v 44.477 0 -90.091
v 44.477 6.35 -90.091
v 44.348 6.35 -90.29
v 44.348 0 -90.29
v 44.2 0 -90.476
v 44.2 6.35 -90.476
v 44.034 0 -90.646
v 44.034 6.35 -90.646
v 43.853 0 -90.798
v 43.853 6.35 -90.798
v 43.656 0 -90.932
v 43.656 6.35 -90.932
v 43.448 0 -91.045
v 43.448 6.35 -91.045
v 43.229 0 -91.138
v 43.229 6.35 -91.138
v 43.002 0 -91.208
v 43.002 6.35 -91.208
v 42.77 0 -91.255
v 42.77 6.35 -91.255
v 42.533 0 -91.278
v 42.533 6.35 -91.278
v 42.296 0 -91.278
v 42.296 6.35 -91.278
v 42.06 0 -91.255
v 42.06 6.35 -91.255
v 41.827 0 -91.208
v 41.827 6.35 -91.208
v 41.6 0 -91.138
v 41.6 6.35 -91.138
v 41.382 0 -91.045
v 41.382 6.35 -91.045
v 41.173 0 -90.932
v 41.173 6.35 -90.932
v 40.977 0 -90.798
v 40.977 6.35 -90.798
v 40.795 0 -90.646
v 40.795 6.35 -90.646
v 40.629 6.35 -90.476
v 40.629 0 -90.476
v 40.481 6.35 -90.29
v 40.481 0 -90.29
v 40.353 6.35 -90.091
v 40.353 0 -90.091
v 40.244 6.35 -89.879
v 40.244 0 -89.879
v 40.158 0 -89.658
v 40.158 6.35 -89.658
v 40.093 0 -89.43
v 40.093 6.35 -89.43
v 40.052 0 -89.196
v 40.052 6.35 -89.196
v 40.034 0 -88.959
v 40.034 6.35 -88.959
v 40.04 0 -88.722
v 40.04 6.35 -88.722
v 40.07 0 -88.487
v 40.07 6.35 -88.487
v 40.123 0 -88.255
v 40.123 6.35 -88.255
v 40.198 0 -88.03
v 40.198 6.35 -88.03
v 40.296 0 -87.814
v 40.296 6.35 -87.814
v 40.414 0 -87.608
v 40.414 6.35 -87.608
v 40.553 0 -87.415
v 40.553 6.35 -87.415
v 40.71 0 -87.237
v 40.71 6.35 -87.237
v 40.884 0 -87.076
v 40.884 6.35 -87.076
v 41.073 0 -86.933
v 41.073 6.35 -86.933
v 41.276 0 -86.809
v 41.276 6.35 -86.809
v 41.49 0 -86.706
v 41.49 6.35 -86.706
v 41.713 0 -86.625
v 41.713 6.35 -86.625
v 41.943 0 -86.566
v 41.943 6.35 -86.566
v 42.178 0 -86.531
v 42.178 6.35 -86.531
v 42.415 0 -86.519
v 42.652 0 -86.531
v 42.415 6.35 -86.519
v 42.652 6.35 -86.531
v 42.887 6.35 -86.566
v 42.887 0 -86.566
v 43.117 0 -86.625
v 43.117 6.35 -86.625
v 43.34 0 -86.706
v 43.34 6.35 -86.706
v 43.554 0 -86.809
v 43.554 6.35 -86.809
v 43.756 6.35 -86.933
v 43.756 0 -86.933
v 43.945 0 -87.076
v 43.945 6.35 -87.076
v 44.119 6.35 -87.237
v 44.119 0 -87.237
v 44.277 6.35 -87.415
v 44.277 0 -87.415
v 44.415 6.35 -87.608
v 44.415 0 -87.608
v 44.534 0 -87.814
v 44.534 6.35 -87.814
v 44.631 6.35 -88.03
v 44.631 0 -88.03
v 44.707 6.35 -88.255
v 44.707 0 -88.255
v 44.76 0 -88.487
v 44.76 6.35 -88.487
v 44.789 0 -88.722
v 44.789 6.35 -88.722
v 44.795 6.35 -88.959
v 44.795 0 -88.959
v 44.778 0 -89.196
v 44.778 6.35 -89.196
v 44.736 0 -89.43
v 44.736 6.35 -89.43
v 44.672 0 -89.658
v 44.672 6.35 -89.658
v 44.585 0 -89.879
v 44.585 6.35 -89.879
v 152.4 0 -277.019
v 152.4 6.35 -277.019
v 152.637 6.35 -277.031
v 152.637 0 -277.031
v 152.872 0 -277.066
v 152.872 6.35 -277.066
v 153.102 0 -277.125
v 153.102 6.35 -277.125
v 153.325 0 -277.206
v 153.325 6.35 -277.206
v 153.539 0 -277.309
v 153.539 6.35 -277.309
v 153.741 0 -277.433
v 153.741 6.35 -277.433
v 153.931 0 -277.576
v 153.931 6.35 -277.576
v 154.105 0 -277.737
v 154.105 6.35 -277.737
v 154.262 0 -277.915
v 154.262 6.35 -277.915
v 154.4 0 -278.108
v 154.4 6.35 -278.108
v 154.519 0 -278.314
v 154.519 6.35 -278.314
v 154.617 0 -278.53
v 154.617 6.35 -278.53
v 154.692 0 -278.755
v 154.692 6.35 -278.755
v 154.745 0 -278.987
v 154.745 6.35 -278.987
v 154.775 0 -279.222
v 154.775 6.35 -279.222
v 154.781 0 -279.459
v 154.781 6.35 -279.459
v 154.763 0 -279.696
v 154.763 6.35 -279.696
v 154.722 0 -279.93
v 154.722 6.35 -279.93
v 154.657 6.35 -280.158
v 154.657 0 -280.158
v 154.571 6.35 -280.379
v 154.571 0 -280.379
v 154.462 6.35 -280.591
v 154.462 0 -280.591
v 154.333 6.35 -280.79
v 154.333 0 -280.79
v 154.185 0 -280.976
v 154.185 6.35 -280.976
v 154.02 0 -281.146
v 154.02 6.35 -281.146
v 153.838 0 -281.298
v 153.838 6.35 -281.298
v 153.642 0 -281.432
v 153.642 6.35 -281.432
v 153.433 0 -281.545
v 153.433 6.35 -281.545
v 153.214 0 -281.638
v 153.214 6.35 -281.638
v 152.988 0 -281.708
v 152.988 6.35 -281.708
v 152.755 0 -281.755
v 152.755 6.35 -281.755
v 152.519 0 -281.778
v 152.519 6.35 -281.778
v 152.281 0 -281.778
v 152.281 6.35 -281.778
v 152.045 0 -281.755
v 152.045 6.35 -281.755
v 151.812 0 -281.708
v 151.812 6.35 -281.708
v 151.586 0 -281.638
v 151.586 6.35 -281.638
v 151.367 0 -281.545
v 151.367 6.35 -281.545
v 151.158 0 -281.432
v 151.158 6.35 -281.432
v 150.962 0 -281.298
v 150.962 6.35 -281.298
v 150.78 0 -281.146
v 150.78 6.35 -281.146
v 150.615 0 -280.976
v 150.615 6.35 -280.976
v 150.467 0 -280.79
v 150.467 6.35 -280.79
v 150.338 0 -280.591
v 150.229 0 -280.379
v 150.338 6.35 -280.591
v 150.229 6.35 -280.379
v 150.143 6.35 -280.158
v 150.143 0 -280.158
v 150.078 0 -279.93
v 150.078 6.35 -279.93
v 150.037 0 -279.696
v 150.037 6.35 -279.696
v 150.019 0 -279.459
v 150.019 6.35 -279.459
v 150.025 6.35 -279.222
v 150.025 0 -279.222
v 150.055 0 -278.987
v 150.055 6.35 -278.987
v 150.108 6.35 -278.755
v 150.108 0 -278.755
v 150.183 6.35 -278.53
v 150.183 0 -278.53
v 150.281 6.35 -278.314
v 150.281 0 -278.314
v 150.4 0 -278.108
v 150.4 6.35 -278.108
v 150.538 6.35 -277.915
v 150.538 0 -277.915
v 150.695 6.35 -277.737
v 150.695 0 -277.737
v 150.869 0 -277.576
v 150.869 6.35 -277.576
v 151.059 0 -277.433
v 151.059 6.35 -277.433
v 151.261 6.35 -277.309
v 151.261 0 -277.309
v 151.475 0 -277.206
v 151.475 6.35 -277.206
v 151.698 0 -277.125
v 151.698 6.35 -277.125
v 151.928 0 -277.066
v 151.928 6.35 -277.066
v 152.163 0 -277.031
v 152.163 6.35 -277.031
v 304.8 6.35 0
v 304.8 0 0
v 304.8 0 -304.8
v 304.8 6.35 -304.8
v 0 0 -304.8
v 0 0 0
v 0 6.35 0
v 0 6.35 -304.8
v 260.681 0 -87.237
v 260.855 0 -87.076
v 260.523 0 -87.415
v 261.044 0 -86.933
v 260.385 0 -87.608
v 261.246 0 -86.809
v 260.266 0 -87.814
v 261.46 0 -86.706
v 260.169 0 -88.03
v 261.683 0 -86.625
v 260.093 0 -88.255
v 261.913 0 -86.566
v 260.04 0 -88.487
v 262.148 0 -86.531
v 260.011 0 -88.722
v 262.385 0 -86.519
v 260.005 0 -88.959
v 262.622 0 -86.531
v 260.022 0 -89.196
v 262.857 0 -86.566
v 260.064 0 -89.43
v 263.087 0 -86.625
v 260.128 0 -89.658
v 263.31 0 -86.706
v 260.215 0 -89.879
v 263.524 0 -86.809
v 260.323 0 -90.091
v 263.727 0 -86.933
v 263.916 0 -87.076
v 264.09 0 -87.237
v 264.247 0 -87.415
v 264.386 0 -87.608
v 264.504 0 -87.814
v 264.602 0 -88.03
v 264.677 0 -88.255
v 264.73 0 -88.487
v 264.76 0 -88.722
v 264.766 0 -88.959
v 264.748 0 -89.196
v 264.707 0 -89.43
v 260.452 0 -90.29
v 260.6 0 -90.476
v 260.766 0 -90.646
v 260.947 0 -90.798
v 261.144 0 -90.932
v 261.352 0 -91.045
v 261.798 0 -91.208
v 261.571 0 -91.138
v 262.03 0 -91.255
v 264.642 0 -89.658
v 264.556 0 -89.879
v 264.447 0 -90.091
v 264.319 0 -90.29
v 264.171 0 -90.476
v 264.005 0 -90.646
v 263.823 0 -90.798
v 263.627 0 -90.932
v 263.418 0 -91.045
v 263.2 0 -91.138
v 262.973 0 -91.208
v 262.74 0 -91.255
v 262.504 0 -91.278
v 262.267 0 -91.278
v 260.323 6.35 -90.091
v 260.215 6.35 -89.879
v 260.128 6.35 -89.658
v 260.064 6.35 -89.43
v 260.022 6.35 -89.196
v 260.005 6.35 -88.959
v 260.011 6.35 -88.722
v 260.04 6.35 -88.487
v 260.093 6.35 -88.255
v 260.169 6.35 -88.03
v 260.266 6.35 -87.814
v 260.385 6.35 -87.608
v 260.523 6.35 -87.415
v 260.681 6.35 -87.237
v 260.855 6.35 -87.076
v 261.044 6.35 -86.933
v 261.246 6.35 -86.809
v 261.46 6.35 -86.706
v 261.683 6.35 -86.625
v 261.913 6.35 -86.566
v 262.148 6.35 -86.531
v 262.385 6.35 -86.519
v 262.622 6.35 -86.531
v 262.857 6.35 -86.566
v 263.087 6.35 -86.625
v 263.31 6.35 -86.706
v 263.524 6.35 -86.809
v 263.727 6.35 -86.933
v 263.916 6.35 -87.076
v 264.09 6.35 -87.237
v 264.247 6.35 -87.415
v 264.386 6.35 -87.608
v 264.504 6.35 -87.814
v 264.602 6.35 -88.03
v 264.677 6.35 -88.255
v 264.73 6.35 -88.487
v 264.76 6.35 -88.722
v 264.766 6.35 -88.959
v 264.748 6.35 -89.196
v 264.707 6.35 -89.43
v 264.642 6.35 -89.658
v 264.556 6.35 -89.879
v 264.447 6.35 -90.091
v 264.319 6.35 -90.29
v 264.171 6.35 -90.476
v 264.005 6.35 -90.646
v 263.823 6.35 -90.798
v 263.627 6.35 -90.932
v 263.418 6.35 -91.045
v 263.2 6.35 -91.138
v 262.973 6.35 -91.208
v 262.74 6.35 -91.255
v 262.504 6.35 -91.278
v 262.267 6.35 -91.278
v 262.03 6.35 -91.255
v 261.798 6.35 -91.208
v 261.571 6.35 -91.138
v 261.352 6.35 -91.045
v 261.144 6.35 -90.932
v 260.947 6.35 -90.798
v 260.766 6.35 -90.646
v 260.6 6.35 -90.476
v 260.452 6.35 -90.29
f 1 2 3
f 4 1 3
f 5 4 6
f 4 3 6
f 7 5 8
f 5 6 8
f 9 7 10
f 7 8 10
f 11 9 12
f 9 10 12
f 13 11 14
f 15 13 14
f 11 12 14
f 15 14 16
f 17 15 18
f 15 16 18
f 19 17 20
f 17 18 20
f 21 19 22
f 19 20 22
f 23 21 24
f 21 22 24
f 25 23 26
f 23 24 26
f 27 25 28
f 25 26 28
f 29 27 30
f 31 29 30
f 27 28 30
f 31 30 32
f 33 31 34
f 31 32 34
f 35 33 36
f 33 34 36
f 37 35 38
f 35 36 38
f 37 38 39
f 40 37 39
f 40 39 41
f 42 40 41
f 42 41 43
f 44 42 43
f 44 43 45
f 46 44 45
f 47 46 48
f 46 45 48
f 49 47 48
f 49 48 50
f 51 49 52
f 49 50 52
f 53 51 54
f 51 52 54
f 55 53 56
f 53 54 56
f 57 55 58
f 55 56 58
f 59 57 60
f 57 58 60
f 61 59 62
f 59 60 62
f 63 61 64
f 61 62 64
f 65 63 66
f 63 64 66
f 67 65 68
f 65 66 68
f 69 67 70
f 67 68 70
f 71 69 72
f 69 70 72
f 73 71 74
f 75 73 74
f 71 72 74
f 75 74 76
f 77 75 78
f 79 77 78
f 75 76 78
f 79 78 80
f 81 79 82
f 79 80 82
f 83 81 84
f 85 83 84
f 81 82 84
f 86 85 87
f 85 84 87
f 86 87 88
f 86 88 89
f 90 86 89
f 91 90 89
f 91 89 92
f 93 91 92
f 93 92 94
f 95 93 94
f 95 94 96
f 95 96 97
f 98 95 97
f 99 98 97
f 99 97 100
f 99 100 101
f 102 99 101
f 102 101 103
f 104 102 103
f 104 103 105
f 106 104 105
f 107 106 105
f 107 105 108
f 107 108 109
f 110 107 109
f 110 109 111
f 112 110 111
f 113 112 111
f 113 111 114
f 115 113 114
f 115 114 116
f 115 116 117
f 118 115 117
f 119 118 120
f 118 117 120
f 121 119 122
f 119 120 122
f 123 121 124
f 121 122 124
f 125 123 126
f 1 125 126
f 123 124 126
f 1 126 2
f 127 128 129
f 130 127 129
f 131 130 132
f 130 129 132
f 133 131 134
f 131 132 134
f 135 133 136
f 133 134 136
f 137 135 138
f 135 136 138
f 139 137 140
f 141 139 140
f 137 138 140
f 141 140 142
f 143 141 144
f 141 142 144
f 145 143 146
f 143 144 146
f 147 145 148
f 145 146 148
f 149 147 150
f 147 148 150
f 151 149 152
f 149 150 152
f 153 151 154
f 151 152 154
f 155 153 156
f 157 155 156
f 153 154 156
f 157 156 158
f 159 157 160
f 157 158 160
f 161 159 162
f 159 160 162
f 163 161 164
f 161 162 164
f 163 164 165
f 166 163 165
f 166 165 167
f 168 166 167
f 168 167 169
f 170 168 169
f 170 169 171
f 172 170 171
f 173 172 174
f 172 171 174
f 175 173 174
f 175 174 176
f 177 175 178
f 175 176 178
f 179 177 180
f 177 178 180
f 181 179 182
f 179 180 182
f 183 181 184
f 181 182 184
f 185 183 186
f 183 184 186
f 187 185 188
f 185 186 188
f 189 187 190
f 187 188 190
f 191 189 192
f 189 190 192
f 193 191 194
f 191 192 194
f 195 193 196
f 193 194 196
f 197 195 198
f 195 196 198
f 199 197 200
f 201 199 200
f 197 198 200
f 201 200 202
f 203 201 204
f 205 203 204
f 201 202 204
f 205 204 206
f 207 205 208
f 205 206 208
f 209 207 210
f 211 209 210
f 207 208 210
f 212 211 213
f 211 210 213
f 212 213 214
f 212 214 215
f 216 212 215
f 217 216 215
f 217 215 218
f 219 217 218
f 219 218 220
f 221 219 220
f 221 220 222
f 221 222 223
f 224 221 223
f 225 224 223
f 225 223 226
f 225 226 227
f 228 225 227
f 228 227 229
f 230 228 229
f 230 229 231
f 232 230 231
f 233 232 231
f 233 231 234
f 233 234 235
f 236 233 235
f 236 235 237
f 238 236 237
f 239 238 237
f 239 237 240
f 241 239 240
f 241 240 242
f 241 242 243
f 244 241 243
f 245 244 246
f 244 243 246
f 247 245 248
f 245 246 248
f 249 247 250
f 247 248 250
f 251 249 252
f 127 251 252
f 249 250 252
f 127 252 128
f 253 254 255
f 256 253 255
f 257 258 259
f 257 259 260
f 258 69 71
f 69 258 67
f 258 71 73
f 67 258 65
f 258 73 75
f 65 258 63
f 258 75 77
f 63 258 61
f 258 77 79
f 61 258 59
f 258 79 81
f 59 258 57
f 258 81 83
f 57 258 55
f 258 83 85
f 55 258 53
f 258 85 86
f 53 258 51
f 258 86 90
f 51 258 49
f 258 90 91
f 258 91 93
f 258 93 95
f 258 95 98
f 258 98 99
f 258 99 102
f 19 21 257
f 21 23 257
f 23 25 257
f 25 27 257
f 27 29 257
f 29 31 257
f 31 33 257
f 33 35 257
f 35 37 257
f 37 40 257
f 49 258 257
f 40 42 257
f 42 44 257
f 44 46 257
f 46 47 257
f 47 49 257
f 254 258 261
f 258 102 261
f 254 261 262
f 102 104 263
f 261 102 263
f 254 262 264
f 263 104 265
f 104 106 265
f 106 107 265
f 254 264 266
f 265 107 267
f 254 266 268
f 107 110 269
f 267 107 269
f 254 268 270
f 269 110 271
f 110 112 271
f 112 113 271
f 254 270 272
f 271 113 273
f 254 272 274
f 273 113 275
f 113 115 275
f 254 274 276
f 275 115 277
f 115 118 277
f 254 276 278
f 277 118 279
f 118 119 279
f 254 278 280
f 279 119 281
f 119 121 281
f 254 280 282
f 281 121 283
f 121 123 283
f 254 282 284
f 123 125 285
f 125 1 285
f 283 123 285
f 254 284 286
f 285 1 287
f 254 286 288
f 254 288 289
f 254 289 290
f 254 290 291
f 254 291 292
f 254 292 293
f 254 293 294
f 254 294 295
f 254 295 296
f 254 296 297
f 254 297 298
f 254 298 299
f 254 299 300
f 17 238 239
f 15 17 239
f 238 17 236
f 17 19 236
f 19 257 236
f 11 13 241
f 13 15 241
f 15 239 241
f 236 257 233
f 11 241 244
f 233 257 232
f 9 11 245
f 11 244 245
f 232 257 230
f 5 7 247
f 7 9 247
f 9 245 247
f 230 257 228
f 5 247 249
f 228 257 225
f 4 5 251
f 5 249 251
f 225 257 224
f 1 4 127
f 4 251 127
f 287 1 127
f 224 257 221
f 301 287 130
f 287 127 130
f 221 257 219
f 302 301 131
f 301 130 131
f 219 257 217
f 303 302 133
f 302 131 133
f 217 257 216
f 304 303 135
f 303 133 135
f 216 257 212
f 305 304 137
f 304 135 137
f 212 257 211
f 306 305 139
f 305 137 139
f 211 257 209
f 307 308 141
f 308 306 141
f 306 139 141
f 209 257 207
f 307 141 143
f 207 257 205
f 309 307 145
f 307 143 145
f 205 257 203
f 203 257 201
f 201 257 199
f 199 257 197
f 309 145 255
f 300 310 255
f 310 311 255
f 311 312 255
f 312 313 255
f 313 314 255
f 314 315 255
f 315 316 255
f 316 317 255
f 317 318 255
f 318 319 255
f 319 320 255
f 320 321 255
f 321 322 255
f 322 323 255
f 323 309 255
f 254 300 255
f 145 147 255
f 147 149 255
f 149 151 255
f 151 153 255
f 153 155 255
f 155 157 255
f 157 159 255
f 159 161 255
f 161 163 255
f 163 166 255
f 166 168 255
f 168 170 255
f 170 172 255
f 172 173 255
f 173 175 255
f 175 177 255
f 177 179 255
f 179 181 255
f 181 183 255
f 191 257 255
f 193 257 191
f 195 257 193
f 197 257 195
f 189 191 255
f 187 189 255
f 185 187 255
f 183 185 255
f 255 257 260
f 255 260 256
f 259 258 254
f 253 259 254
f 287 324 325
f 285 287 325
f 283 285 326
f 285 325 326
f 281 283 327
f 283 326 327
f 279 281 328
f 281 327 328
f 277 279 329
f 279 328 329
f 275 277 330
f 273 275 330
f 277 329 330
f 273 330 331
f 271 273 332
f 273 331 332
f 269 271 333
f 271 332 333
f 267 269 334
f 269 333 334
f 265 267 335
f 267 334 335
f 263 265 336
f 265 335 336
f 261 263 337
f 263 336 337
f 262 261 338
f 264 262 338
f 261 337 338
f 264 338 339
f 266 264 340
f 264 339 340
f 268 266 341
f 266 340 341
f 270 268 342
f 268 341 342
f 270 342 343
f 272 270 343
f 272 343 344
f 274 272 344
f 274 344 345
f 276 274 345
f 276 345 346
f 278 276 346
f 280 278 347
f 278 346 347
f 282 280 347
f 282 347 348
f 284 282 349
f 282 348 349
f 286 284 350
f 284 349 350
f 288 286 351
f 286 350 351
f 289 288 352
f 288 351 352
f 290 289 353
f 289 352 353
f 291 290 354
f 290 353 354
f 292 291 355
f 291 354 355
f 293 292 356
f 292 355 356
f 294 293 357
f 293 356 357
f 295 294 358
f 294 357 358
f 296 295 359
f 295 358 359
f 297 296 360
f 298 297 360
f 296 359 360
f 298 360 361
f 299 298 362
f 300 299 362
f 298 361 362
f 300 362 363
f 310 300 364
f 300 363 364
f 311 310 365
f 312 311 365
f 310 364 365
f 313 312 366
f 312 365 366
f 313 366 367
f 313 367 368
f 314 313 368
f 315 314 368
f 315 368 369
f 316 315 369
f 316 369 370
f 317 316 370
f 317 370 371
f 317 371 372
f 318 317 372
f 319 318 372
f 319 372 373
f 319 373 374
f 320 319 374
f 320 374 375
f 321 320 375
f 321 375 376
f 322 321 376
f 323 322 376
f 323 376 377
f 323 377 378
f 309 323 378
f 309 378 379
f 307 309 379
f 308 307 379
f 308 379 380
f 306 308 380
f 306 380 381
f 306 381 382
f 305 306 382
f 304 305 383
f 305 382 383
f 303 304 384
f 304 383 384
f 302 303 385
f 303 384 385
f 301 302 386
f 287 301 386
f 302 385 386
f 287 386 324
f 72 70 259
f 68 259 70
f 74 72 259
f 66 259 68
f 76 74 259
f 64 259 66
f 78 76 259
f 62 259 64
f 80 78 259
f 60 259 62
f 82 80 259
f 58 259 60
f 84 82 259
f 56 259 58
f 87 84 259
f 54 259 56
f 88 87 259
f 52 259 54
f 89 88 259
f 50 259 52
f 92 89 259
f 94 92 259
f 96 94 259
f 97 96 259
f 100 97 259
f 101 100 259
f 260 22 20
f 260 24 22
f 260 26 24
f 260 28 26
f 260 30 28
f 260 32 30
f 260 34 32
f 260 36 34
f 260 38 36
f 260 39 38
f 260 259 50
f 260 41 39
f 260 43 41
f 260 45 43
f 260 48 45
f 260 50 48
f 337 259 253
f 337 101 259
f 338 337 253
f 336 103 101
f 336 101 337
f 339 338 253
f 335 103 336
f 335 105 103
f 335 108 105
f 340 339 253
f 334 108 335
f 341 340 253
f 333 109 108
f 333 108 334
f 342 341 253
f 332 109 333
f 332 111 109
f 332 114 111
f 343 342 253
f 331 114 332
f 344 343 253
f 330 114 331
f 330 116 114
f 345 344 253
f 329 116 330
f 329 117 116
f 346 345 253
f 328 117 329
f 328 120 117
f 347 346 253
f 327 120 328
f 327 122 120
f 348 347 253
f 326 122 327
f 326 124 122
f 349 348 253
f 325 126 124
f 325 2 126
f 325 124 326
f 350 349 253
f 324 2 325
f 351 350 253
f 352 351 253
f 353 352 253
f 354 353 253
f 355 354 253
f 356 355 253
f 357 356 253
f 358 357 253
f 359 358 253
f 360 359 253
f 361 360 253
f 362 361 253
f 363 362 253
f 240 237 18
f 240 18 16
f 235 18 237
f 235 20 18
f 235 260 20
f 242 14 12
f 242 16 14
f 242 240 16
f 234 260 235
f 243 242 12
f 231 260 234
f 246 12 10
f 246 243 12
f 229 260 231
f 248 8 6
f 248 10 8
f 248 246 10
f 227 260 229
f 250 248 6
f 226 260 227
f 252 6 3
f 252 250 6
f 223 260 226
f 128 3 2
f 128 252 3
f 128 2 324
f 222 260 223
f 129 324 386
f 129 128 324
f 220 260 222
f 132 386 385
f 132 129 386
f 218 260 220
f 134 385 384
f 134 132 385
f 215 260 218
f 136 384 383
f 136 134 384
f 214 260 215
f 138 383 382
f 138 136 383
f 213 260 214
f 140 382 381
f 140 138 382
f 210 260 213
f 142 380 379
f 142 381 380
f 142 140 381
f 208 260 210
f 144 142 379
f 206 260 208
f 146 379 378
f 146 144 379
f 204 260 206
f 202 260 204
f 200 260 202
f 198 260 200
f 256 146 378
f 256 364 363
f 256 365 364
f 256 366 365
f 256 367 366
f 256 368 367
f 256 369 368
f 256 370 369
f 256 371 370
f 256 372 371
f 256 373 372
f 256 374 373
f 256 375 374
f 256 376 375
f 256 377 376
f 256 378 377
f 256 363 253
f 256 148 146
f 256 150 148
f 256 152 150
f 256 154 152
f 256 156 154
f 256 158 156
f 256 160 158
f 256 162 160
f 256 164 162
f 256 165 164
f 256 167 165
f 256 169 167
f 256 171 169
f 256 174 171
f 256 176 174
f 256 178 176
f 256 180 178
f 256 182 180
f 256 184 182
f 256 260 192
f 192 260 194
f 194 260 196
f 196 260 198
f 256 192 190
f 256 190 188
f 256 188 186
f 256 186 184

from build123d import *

# Parameters (mm, degrees)
SKETCH1_W           = 304.8
SKETCH1_H           = 304.8
BOSS_EXTRUDE1_DEPTH = 6.35
SKETCH2_R           = 2.38125
CUT_EXTRUDE1_DEPTH  = 6.35
CIRPATTERN1_COUNT   = 3


with BuildPart() as part:
    # Sketch1 → Boss-Extrude1 (new body)
    with BuildSketch(Plane(origin=(0, 0, 0), x_dir=(1, 0, 0), z_dir=(0, 1, 0))):
        with Locations((152.4, 152.4)):
            Rectangle(SKETCH1_W, SKETCH1_H)
    extrude(amount=BOSS_EXTRUDE1_DEPTH)

    # Sketch2 → Cut-Extrude1 (cut)
    with BuildSketch(Plane(origin=(0, 6.35, 0), x_dir=(1, 0, 0), z_dir=(0, 1, 0))):
        with Locations((152.4, 279.4)):
            Circle(SKETCH2_R)
    cut_extrude1 = extrude(amount=-CUT_EXTRUDE1_DEPTH, mode=Mode.SUBTRACT)

    # CirPattern1: Cut-Extrude1 ×3 about axis
    cirpattern1_axis = Axis((152.4, -0.3175, -152.4), (0, 1, 0))
    for i in range(1, CIRPATTERN1_COUNT):
        add(cut_extrude1.rotate(cirpattern1_axis, i * 360 / CIRPATTERN1_COUNT), mode=Mode.SUBTRACT)


solid = part.part
